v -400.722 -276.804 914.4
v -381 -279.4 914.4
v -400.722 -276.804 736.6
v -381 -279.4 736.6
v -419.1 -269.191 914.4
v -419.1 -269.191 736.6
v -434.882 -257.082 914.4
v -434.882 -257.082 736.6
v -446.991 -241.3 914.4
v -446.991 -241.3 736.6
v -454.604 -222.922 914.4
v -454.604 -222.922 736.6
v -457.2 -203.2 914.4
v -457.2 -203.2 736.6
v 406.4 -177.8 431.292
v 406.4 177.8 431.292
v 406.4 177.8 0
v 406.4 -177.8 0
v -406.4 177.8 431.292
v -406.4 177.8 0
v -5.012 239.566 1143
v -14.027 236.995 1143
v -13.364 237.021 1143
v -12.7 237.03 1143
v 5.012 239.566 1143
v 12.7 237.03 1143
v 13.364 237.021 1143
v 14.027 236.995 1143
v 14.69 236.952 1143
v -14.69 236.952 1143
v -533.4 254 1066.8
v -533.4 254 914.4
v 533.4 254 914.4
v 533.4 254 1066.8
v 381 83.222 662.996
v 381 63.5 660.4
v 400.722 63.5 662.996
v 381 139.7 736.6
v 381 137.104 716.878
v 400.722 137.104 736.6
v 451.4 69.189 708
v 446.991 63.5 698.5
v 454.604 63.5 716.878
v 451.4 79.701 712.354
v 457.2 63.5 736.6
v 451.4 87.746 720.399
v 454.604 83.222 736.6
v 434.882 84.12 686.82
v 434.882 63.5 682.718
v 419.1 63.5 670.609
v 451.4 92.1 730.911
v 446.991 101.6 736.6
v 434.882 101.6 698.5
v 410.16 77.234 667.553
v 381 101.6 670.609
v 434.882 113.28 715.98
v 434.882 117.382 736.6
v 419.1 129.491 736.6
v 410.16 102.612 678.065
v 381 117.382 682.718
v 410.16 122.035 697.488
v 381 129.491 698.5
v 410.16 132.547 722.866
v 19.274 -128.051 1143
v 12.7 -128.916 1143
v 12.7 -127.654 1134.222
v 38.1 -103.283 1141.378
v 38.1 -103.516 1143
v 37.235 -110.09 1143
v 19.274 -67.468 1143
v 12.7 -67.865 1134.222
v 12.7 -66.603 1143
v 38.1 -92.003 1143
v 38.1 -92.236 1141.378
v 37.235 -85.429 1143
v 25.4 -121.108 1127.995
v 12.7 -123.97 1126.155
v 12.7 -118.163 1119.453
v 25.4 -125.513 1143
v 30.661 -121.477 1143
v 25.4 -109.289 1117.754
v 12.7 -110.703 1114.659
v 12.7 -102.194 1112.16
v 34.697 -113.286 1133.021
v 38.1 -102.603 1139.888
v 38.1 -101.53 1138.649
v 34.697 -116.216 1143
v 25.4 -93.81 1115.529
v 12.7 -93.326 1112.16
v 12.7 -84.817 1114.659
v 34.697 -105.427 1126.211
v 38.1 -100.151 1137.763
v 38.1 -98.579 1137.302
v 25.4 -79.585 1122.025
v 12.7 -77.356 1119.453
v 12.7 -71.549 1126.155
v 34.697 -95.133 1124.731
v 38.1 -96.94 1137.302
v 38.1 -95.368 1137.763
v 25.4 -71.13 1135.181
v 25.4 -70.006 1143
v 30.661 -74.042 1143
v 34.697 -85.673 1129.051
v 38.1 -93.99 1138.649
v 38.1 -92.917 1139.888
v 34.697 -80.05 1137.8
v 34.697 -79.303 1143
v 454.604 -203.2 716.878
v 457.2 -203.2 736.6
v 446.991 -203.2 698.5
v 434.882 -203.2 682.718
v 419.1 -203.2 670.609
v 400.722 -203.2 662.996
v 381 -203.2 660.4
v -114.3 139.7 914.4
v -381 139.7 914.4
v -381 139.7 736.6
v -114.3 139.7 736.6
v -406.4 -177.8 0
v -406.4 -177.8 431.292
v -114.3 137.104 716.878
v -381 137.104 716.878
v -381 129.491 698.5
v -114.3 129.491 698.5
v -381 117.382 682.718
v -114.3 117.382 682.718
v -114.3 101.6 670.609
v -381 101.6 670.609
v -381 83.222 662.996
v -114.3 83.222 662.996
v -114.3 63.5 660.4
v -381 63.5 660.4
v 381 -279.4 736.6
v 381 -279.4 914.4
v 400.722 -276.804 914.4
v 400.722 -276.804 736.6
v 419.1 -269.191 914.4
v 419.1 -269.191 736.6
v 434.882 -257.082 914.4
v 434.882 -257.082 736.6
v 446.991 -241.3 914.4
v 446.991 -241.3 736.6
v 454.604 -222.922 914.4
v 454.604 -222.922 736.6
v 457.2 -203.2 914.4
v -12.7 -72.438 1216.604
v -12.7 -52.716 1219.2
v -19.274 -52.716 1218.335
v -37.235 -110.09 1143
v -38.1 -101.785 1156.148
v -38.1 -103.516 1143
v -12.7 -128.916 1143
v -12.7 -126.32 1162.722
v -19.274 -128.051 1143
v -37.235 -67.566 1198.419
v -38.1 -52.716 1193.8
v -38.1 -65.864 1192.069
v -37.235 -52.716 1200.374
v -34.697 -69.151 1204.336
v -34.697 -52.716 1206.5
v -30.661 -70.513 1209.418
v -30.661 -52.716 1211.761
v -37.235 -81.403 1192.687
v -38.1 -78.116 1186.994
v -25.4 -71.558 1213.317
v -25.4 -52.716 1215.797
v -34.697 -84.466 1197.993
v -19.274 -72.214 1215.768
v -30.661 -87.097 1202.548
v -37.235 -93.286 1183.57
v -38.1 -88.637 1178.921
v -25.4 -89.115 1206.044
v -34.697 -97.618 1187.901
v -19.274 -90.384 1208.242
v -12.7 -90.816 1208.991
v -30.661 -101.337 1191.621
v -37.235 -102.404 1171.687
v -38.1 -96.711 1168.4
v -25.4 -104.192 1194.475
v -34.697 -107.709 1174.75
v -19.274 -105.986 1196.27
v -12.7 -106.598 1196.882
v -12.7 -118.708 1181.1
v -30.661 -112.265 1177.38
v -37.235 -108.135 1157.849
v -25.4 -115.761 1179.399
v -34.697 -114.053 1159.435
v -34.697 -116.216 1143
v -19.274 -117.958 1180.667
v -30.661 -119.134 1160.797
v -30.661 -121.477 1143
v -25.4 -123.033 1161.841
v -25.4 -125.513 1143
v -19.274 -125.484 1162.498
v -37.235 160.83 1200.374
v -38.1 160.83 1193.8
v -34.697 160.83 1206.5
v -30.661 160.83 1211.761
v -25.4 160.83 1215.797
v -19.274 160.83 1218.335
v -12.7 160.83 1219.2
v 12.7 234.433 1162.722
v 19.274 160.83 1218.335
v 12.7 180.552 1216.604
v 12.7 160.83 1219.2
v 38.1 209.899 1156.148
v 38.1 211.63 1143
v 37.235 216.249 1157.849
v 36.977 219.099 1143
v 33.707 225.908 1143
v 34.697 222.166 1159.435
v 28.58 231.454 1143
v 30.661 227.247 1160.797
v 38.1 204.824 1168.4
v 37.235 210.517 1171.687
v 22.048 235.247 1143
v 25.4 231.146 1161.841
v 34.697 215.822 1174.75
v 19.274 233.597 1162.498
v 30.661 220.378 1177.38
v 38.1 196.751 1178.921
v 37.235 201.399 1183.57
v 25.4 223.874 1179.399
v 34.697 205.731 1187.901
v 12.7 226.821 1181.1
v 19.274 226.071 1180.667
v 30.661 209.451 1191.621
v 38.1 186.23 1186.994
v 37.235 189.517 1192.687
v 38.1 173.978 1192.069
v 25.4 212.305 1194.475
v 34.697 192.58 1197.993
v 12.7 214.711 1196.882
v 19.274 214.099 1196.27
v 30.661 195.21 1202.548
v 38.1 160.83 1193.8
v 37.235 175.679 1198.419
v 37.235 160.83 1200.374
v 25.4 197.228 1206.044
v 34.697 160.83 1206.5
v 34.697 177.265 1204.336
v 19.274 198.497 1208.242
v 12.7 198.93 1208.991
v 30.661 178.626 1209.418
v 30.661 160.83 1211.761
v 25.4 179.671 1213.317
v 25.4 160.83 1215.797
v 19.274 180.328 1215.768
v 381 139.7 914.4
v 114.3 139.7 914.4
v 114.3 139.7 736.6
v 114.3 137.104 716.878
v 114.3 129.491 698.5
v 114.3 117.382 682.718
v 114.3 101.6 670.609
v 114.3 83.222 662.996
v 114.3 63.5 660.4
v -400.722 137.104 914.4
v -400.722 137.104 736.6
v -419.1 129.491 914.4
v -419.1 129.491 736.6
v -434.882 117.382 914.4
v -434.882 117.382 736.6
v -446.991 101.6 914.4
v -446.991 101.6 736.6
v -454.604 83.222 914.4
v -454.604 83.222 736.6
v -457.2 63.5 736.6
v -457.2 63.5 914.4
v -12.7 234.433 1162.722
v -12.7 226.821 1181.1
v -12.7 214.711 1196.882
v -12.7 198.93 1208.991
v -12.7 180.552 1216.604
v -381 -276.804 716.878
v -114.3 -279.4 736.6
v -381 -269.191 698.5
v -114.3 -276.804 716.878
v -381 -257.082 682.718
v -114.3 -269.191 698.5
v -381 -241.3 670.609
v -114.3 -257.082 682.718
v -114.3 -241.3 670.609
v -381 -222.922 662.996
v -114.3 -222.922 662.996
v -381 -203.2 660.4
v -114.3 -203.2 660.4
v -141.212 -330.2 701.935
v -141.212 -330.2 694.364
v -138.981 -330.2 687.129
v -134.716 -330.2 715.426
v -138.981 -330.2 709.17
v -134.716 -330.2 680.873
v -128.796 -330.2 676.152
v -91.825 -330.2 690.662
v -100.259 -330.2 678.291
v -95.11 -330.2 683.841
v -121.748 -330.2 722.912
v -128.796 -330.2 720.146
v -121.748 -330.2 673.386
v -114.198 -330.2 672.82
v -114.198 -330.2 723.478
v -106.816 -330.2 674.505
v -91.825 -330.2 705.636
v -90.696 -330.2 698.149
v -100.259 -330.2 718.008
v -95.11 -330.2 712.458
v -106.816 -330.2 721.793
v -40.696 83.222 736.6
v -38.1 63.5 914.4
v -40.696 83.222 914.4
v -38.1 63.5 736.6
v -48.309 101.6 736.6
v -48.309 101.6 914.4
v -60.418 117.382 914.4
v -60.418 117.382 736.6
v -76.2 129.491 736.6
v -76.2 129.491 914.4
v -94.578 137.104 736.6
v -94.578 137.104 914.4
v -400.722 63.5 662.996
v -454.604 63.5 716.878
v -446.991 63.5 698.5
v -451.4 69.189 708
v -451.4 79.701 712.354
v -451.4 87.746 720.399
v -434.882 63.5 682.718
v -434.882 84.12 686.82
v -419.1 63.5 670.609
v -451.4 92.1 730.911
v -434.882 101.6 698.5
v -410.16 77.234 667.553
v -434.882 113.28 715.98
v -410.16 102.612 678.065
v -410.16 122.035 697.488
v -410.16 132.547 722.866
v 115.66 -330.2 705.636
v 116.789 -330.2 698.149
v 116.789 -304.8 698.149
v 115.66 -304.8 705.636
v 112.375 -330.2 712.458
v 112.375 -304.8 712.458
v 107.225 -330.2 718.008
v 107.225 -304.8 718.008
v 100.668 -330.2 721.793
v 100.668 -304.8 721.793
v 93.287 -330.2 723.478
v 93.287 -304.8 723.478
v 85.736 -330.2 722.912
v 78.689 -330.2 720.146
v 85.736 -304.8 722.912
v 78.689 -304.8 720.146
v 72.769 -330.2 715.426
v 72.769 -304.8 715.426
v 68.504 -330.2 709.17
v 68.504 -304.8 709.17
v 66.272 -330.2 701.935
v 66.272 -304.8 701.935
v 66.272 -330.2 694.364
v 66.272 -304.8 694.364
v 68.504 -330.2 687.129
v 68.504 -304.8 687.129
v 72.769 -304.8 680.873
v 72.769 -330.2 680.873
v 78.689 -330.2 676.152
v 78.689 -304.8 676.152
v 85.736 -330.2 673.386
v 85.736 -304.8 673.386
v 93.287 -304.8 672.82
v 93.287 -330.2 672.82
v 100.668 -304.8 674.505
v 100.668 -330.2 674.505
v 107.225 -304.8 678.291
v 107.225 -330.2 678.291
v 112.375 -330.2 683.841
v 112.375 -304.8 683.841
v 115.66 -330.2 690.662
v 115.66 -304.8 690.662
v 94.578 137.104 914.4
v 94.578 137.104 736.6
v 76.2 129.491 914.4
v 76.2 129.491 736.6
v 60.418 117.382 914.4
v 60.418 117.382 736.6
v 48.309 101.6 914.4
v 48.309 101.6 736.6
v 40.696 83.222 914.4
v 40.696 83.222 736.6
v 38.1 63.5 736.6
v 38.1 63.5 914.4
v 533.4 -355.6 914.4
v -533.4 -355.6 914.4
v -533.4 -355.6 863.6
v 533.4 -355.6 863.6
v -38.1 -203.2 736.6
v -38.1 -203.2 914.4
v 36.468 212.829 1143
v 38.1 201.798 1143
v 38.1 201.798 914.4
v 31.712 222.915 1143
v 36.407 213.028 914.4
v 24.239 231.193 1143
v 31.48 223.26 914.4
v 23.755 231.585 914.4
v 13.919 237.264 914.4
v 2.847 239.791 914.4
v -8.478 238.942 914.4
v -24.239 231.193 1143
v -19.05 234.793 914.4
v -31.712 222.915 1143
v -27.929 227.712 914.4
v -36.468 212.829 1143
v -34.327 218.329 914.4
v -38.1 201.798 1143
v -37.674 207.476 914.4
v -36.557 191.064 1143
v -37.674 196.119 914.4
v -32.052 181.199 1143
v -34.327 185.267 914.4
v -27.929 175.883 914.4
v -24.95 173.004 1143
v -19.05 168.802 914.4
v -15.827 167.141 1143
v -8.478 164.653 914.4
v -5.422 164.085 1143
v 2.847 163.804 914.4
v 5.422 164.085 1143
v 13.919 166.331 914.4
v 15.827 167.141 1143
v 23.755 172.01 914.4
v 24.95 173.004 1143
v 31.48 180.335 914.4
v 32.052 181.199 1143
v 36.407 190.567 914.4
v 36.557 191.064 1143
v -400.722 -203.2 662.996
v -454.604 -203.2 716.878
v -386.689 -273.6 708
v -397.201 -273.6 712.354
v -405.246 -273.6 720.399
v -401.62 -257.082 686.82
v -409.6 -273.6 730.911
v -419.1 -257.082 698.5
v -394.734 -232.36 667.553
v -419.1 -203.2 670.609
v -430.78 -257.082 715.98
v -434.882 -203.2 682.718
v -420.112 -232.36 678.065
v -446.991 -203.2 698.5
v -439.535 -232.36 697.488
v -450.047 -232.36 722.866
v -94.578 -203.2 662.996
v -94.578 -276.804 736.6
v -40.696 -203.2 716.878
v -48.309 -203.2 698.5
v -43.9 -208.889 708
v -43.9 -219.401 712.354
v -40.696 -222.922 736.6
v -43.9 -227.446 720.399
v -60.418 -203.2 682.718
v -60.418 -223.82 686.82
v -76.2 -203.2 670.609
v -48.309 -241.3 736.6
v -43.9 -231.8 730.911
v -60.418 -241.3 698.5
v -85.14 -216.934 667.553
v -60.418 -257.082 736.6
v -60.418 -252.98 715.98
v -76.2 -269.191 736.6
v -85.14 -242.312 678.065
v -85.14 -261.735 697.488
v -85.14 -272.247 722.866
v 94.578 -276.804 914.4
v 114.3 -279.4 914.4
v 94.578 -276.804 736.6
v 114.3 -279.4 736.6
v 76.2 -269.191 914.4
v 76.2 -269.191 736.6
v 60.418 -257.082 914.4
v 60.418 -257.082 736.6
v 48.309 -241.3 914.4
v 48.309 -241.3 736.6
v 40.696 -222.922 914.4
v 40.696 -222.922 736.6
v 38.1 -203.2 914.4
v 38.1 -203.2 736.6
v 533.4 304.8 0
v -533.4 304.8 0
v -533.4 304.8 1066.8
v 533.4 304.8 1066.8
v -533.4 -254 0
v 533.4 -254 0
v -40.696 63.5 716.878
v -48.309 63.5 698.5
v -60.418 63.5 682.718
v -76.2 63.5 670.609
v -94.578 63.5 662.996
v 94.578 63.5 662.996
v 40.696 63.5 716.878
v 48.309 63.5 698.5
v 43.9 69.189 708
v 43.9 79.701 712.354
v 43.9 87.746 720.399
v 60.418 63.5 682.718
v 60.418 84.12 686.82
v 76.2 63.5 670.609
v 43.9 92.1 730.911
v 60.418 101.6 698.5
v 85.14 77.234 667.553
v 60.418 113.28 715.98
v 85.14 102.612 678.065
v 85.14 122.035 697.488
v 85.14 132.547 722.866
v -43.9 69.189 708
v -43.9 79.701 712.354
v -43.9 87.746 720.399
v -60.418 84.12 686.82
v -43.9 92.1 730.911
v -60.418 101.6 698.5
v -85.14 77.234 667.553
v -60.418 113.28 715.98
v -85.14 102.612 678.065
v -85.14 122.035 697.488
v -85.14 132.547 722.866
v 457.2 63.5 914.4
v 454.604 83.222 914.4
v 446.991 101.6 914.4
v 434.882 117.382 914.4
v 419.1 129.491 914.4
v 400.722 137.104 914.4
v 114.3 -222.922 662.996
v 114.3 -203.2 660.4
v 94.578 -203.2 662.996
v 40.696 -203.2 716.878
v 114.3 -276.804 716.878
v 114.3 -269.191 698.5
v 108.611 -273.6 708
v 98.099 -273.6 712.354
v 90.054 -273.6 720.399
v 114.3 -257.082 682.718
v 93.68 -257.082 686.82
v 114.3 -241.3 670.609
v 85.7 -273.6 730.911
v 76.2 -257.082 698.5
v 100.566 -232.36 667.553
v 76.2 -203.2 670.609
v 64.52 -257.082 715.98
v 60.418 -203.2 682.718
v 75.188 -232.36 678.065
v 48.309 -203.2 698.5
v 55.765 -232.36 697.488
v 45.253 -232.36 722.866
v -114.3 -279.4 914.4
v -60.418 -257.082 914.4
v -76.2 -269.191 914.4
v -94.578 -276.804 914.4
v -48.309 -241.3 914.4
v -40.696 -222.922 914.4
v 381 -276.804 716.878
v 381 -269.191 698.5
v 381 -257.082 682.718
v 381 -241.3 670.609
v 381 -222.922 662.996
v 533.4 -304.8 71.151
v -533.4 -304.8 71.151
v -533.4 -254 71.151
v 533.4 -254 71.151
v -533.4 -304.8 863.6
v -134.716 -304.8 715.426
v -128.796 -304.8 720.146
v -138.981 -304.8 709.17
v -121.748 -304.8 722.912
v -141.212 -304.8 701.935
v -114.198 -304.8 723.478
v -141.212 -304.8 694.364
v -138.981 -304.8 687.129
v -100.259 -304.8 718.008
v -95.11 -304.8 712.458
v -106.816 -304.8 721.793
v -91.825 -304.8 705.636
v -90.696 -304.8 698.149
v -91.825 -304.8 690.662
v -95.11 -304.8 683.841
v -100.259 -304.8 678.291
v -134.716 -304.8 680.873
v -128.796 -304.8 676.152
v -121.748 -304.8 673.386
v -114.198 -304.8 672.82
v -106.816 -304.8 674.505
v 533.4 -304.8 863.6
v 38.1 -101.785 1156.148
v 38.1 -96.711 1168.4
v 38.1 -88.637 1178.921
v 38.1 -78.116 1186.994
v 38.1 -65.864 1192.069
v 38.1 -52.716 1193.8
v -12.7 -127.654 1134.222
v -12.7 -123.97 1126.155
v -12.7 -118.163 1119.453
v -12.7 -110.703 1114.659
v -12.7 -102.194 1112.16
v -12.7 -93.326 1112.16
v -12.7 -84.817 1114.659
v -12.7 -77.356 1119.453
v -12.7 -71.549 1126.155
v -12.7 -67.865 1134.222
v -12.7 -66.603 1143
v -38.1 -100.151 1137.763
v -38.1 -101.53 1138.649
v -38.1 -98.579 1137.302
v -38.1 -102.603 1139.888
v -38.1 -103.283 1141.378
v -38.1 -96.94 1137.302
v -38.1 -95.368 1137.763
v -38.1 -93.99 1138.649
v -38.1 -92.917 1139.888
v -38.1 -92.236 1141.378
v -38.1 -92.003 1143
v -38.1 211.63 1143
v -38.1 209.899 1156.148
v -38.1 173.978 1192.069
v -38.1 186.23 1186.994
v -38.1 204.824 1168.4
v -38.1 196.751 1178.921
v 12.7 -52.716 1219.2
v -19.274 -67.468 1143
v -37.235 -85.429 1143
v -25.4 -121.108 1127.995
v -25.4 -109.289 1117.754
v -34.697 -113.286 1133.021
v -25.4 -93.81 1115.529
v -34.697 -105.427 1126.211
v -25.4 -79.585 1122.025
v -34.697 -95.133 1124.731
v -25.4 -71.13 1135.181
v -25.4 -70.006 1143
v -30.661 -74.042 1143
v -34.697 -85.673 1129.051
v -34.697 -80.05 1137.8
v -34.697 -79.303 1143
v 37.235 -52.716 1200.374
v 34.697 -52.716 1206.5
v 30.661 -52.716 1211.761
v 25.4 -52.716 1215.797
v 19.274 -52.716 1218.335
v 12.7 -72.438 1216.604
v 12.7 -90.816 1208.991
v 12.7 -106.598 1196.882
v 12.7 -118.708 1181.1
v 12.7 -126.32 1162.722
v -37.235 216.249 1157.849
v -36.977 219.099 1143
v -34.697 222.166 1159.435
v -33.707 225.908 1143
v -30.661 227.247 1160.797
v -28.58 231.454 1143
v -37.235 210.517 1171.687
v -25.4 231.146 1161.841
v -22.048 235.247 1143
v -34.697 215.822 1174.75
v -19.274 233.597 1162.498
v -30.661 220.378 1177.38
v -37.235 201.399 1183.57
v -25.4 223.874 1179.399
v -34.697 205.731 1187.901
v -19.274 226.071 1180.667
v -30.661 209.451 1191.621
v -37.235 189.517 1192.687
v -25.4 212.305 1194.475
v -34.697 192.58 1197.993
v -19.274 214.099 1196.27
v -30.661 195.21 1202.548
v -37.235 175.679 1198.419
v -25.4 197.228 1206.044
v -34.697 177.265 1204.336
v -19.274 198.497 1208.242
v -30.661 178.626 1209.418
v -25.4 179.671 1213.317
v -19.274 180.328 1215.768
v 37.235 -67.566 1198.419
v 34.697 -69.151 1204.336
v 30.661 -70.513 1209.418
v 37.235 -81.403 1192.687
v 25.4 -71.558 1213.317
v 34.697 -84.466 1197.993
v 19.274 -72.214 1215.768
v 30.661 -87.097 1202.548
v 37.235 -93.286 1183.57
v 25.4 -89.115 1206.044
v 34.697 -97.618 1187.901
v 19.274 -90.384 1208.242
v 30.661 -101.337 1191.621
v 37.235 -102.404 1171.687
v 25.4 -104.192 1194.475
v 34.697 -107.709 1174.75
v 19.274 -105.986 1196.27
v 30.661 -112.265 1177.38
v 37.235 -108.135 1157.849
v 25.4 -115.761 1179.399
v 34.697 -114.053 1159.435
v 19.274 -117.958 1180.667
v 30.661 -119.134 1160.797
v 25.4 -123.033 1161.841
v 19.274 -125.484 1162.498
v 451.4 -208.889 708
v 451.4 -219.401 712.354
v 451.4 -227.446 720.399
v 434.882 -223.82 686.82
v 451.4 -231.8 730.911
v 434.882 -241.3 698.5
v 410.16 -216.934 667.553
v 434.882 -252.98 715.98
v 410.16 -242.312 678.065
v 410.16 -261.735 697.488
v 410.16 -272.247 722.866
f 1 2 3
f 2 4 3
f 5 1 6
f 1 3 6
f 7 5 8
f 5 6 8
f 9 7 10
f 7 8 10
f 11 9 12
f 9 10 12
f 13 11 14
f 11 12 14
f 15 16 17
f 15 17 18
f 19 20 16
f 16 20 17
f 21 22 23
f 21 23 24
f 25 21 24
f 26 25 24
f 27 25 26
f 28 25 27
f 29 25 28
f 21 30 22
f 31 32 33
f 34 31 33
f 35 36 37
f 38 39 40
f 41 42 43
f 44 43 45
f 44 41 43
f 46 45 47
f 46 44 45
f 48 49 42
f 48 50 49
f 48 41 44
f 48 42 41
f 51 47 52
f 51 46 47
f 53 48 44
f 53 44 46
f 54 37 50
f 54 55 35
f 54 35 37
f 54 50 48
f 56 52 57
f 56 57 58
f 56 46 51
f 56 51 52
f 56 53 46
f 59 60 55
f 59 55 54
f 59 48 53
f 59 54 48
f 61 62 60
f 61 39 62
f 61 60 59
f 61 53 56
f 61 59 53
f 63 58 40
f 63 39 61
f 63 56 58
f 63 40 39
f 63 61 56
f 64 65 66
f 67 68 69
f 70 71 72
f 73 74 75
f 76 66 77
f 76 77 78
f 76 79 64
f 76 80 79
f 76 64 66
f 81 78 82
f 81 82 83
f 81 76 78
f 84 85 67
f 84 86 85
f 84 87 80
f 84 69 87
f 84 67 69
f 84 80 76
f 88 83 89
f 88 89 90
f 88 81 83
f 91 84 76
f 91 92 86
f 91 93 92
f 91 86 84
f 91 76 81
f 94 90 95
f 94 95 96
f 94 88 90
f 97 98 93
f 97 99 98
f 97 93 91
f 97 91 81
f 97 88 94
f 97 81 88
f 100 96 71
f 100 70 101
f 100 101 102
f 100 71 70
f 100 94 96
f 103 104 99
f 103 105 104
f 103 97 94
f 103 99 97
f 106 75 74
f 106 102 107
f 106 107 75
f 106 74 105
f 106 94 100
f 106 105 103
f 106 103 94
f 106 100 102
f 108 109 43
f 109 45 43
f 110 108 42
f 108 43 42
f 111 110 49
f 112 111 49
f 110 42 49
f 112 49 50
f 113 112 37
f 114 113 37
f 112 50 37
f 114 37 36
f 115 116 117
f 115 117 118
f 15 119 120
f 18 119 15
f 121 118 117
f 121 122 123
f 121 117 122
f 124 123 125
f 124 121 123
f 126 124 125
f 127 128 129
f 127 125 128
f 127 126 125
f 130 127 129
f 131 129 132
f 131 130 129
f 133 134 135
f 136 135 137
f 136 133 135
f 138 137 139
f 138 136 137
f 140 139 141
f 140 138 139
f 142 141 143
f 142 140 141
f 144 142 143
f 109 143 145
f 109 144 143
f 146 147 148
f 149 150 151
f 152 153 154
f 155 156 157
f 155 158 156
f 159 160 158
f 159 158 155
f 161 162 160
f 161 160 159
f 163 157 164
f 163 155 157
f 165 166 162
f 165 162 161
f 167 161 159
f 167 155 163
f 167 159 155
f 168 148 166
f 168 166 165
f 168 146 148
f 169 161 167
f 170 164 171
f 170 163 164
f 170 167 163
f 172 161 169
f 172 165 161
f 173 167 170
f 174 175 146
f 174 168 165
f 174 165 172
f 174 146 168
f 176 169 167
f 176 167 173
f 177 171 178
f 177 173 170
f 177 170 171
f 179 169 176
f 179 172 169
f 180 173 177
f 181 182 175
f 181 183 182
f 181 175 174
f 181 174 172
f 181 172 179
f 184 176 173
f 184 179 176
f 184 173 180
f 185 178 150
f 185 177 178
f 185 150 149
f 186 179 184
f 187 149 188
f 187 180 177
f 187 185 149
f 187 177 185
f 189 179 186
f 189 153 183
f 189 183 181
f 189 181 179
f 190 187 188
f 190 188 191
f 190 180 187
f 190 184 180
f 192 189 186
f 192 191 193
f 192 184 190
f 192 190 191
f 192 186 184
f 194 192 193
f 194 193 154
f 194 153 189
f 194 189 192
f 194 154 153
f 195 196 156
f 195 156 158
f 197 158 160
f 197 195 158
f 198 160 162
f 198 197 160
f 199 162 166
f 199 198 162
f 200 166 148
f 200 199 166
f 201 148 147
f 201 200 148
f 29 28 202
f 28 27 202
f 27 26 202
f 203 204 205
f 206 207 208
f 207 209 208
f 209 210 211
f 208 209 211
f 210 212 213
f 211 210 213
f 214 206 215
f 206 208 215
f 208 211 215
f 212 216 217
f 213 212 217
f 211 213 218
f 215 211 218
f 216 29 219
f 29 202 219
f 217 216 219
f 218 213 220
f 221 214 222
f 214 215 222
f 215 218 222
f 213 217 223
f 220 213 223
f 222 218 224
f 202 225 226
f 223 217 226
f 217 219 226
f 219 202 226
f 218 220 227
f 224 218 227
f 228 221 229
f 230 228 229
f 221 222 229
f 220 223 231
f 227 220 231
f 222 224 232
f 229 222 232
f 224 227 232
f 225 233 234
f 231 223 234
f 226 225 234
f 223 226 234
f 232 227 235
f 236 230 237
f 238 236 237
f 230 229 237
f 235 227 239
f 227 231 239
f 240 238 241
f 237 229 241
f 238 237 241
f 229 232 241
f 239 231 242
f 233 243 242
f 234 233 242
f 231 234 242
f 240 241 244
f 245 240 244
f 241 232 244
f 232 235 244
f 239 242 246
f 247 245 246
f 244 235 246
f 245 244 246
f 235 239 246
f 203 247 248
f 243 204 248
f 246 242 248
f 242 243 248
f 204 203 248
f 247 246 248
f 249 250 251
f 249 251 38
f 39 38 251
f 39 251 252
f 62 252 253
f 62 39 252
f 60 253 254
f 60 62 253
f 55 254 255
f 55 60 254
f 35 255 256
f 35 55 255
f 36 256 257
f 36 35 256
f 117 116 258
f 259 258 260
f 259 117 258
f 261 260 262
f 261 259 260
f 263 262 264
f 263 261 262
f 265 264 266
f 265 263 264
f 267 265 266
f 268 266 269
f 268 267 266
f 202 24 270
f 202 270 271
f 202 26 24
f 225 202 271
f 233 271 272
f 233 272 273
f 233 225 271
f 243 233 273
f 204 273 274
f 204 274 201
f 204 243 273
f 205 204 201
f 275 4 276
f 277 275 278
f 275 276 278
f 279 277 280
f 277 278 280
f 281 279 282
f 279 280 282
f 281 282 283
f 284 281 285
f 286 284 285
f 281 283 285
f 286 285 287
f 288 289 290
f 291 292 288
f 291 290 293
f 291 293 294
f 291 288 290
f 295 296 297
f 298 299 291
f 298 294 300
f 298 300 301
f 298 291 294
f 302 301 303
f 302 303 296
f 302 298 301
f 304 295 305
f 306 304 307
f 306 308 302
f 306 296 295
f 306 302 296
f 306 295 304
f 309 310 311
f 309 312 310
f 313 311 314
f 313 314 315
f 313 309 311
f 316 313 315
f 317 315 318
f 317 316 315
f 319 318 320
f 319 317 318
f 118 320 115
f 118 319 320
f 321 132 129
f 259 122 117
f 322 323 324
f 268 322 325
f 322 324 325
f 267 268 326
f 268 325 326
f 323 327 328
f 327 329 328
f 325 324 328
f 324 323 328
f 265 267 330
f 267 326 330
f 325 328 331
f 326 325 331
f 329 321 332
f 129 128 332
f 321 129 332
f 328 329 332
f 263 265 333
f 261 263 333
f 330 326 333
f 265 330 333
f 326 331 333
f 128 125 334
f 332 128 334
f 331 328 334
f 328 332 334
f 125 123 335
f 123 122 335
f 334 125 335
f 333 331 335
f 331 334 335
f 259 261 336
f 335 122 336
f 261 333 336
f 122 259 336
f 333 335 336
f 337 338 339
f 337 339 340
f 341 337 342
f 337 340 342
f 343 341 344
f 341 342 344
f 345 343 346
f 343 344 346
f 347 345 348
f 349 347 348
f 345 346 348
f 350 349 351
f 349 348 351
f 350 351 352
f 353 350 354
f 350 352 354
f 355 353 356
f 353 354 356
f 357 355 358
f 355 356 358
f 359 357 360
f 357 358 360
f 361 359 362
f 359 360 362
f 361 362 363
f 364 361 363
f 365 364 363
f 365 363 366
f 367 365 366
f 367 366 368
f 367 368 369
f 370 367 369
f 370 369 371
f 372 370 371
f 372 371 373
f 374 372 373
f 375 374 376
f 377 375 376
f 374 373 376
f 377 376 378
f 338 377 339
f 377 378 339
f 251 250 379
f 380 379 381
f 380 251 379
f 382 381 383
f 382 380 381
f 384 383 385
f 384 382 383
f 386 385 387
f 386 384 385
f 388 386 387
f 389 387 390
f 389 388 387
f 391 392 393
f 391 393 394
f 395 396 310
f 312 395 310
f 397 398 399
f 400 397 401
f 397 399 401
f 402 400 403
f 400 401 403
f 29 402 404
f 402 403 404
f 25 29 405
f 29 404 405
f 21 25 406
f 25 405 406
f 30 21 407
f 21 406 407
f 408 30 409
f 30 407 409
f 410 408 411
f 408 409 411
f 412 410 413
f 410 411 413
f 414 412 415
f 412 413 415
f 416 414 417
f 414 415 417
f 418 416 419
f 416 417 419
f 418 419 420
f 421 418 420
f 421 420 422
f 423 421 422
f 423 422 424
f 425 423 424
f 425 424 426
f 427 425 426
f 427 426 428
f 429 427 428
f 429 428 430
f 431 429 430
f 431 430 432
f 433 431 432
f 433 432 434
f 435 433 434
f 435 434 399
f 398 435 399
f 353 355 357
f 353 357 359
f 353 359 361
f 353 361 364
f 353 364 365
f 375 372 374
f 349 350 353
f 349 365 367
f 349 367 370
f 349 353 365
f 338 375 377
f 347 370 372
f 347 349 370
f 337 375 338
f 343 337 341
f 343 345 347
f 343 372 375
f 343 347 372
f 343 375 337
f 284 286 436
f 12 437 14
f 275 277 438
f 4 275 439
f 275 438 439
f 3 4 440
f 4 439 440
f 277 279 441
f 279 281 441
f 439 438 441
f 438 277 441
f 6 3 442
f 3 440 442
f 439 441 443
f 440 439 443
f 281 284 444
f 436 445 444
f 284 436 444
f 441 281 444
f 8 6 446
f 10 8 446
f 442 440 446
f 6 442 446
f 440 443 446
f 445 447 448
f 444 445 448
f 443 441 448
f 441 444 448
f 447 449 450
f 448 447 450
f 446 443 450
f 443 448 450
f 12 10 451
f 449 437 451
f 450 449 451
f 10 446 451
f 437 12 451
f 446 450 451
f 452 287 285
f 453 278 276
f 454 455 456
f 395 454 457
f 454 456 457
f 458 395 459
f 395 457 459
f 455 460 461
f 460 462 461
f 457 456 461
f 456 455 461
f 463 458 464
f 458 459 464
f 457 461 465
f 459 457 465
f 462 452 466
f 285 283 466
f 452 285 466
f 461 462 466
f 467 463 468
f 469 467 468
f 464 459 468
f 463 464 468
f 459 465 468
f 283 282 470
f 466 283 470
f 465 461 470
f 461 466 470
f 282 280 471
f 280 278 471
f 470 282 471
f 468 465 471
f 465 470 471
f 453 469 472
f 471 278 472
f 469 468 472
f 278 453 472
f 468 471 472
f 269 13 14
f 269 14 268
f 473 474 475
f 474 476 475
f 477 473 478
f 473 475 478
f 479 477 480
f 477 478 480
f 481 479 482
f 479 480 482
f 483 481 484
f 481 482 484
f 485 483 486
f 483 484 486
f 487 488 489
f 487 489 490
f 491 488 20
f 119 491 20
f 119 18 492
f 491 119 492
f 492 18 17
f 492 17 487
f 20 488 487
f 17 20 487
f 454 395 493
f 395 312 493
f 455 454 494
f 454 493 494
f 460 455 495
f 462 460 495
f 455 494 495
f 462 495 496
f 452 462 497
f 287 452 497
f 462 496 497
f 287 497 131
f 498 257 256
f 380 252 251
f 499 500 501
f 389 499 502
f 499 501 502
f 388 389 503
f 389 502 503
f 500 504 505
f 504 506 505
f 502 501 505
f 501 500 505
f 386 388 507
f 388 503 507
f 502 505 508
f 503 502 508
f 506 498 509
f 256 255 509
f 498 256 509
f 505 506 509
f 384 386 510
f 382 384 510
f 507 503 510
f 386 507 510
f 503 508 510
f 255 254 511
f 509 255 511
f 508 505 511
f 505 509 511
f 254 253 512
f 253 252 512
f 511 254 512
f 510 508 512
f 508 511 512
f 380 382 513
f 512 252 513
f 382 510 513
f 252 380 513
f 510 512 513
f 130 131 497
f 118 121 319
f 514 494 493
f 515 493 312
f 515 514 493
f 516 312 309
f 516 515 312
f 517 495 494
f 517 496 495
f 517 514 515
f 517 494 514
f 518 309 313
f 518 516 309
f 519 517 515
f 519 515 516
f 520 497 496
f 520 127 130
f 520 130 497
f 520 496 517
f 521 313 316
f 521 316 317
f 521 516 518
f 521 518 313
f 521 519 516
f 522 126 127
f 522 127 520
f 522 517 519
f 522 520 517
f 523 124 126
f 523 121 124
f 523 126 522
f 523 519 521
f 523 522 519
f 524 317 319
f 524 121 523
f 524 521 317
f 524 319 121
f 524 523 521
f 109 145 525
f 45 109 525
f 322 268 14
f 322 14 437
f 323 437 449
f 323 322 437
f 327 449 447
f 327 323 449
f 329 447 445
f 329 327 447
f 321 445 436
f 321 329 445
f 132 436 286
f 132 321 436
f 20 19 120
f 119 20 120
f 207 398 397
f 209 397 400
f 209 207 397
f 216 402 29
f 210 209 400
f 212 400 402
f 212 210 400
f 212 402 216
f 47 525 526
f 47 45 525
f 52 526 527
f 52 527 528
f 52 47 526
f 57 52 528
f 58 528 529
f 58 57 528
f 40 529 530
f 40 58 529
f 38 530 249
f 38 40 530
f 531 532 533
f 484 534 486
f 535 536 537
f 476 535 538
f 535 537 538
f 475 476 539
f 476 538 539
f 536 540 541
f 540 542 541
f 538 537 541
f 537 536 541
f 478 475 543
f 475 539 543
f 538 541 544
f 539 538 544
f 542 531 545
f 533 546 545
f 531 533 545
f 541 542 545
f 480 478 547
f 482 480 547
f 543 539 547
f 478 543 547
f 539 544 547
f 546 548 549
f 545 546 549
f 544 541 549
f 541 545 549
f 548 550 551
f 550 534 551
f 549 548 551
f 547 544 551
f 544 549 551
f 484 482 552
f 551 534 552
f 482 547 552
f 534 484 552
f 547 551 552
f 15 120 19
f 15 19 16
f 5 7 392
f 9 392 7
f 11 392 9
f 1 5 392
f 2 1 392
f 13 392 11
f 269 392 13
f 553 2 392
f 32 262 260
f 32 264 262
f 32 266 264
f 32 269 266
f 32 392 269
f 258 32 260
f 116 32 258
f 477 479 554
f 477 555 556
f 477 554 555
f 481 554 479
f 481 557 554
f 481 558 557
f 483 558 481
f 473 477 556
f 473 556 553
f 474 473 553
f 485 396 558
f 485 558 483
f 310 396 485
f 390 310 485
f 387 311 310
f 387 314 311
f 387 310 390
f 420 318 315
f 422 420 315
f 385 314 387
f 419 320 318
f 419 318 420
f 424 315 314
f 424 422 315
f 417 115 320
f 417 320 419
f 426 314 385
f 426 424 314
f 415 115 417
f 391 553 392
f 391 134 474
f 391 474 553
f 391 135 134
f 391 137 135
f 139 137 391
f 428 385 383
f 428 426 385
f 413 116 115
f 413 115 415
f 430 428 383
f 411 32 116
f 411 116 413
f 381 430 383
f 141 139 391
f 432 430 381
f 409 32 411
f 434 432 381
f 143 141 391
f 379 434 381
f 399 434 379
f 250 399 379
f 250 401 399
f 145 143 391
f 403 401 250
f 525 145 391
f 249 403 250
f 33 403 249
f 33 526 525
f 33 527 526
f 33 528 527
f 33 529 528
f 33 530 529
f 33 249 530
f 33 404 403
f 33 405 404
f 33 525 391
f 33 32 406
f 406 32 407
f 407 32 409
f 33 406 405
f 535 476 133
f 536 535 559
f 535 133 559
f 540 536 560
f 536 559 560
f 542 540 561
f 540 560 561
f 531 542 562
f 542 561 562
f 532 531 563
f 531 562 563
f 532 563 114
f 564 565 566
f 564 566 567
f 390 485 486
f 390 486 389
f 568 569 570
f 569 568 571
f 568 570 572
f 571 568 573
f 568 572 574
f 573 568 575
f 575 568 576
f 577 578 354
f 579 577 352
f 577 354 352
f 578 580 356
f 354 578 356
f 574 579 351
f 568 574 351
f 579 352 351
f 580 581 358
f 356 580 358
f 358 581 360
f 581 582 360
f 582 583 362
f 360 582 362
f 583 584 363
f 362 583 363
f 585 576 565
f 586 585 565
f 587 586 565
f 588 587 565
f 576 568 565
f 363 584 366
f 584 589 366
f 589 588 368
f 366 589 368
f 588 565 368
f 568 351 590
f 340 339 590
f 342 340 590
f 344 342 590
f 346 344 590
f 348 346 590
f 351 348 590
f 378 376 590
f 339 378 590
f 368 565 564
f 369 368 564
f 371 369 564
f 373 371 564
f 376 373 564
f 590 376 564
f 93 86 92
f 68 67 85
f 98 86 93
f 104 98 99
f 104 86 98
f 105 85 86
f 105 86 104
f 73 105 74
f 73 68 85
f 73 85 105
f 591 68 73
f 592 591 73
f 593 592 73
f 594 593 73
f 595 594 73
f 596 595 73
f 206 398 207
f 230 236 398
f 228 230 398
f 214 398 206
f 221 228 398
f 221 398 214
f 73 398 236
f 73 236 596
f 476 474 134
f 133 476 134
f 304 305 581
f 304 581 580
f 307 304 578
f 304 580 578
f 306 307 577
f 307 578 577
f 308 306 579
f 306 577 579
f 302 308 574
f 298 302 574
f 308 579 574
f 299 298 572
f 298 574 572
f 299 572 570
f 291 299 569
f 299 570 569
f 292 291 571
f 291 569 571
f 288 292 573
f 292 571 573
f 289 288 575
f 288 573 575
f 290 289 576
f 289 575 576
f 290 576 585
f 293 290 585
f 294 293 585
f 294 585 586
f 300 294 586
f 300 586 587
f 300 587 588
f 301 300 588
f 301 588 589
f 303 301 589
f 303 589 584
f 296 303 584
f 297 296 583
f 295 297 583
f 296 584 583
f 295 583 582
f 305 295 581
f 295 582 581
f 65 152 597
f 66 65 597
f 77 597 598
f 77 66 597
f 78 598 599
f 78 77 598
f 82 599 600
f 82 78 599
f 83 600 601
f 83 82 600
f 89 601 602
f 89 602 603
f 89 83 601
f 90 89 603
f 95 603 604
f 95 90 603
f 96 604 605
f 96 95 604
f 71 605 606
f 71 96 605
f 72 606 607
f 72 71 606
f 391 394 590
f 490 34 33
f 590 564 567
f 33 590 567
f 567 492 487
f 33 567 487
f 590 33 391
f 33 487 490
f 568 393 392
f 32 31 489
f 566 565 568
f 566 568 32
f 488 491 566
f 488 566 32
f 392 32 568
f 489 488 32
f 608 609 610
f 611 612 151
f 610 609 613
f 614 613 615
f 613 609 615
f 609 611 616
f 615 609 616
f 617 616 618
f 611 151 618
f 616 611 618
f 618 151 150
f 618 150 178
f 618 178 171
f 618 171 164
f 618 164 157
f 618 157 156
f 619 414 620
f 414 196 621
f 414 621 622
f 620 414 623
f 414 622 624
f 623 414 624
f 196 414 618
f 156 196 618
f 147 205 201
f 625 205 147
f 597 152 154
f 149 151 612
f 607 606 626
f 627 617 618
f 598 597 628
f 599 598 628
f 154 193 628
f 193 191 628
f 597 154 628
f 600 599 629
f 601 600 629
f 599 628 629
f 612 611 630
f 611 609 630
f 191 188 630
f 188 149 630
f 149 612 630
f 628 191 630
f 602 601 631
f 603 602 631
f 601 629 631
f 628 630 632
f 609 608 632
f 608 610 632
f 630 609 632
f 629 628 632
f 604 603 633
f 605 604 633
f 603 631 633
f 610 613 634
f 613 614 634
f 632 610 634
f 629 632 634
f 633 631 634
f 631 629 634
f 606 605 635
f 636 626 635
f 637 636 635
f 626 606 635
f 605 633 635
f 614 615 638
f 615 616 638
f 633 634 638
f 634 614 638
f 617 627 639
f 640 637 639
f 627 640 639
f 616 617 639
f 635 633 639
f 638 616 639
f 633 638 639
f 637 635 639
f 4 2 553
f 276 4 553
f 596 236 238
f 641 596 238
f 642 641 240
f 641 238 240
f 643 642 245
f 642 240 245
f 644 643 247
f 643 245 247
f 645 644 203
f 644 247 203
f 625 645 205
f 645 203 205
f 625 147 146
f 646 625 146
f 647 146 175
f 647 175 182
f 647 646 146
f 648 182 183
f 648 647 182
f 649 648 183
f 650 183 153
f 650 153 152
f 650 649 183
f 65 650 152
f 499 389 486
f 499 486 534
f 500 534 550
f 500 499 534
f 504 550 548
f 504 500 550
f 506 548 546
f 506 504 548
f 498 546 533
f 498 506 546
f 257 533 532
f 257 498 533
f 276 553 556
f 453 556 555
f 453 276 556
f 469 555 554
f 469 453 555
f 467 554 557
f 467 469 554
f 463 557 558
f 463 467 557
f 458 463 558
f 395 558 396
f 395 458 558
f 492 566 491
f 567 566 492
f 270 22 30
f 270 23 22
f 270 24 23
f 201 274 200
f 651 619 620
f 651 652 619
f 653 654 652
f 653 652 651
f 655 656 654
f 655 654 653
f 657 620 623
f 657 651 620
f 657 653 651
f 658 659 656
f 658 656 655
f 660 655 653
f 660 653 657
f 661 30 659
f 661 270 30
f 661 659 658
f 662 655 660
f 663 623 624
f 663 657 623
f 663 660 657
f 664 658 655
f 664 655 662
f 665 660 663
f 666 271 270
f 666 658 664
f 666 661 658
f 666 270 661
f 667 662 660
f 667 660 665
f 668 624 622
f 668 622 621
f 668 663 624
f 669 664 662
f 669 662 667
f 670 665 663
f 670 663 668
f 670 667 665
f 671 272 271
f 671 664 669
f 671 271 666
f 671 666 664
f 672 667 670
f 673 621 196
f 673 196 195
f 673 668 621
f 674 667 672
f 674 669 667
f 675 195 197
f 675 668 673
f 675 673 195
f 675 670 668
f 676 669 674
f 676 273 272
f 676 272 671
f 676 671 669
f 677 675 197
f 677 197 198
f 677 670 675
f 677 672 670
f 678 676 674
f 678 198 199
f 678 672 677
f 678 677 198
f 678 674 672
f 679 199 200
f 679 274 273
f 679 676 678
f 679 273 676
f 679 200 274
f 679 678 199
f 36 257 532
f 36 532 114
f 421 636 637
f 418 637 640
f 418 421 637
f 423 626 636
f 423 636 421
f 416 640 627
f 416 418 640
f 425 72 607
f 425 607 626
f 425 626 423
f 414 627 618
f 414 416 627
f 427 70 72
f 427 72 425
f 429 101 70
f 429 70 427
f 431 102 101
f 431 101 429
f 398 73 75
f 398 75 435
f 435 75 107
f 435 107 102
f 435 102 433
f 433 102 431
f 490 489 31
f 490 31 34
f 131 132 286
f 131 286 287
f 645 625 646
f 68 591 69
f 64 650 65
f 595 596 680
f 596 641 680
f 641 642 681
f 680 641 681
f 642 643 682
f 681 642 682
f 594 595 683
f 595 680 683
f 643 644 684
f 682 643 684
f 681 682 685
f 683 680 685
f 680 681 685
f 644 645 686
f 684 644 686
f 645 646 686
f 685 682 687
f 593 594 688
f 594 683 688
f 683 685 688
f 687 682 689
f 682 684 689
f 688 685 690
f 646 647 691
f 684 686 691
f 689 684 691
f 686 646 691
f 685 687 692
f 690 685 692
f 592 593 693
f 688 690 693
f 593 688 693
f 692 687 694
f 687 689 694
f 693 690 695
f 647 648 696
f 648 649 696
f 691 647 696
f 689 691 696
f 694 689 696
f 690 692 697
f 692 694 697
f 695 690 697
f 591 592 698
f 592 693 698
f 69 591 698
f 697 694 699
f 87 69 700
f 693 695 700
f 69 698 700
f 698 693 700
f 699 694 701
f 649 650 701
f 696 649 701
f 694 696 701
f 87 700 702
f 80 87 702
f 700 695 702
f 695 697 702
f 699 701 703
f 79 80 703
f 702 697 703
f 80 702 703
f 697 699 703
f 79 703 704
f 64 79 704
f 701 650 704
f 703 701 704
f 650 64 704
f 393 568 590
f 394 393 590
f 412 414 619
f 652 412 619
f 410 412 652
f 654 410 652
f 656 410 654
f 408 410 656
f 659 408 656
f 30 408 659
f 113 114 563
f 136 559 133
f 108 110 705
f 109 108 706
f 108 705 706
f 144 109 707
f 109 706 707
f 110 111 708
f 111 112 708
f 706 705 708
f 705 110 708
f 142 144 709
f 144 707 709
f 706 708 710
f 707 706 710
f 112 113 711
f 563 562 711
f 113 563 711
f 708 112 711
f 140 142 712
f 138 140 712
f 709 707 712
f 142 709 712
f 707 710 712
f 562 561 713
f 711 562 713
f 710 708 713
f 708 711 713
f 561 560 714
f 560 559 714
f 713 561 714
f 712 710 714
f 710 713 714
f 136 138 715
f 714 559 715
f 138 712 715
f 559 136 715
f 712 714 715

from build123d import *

# Parameters (mm, degrees)
F0_W          = 1066.8
F0_H          = 609.6
F1_DEPTH      = 914.4
F2_W          = 1066.8
F2_H          = 50.8
F2_H_2        = 609.6
F3_DEPTH      = 50.8
F4_W          = 1066.8
F4_H          = 50.8
F5_DEPTH      = 152.4
F4_W_2        = 419.1
F4_H_2        = 419.1
F6_DEPTH      = 254
F7_R          = 76.2
F4_R          = 38.1
F8_DEPTH      = 228.6
F10_DEPTH     = 38.1
F11_T3_DEPTH  = 213.5462481737
F11_T6_DEPTH  = 213.5462481737
F11_T9_ANGLE  = 180
F11_T12_ANGLE = 180
F11_T15_ANGLE = 90
F11_T18_ANGLE = 90
F11_T21_ANGLE = 90
F11_T24_ANGLE = 90
F12_W         = 812.8
F12_H         = 355.6
F13_DEPTH     = 431.292
F14_W         = 1066.8
F14_H         = 71.1514726281
F15_DEPTH     = 50.8
F16_R         = 25.4
F17_DEPTH     = 25.4


# Not quite as in the source:
# - a fillet or chamfer that OpenCascade refuses, or shapes differently, is made with other operations: its cross-section is extruded or revolved along the edge and cut away or added


with BuildPart() as f1:
    # F0 (on Top) → F1 (new body)
    with BuildSketch(Plane.XY):
        Rectangle(F0_W, F0_H)
    extrude(amount=F1_DEPTH)

    # F2 (on face) → F3 (join)
    with BuildSketch(Plane.XY.offset(914.4)):
        with Locations((0, -330.2)):
            Rectangle(F2_W, F2_H)
        Rectangle(F2_W, F2_H_2)
    extrude(amount=-F3_DEPTH)

    # F4 (on face) → F5 (join)
    with BuildSketch(Plane.XY.offset(914.4)):
        with Locations((0, 279.4)):
            Rectangle(F4_W, F4_H)
    extrude(amount=F5_DEPTH)

    # F4 (on face) → F6 (cut)
    with BuildSketch(Plane.XY.offset(914.4)):
        with Locations((-247.65, -69.85)):
            Rectangle(F4_W_2, F4_H_2)
        with Locations((247.65, -69.85)):
            Rectangle(F4_W_2, F4_H_2)
    extrude(amount=-F6_DEPTH, mode=Mode.SUBTRACT)

    # F7
    f7_edges = [f1.edges().sort_by_distance(p)[0] for p in [
        (-247.65, 139.7, 660.4),
        (-457.2, -69.85, 660.4),
        (-247.65, -279.4, 660.4),
        (-38.1, -69.85, 660.4),
        (247.65, 139.7, 660.4),
        (38.1, -69.85, 660.4),
        (247.65, -279.4, 660.4),
        (457.2, -69.85, 660.4),
        (457.2, 139.7, 787.4),
        (38.1, 139.7, 787.4),
        (457.2, -279.4, 787.4),
        (38.1, -279.4, 787.4),
        (-457.2, -279.4, 787.4),
        (-38.1, -279.4, 787.4),
        (-38.1, 139.7, 787.4),
        (-457.2, 139.7, 787.4),
    ]]
    fillet(f7_edges, radius=F7_R)

    # F4 (on face) → F8 (join)
    with BuildSketch(Plane.XY.offset(914.4)):
        with Locations((0, 201.7975896597)):
            Circle(F4_R)
    extrude(amount=F8_DEPTH)

    # F9 (on Right) → F10 (join, symmetric)
    with BuildSketch(Plane.YZ):
        with BuildLine():
            Line((160.8298355818, 1219.2), (-52.7164125919, 1219.2))
            ThreePointArc((-52.7164125919, 1219.2), (-106.5979493183, 1196.8815367264), (-128.9164125919, 1143))
            ThreePointArc((-128.9164125919, 1143), (-97.7595895529, 1174.1568230391), (-66.6027665138, 1143))
            Line((-66.6027665138, 1143), (237.0298355818, 1143))
            ThreePointArc((237.0298355818, 1143), (214.7113723082, 1196.8815367264), (160.8298355818, 1219.2))
        make_face()
        with BuildLine():
            ThreePointArc((-66.6027665138, 1143), (-97.7595895529, 1174.1568230391), (-128.9164125919, 1143))
            Line((-128.9164125919, 1143), (-66.6027665138, 1143))
        make_face()
        with BuildLine():
            Line((-66.6027665138, 1143), (-128.9164125919, 1143))
            ThreePointArc((-128.9164125919, 1143), (-97.7595895529, 1111.8431769609), (-66.6027665138, 1143))
        make_face()
    extrude(amount=F10_DEPTH, both=True)

    # F11: fillet of radius 25.4 on 8 edges, made by hand


with BuildPart() as f11_tool1:
    # F11_s2 → F11_t3 (new body)
    with BuildSketch(Plane.XZ.offset(-160.8298355818)):
        with BuildLine():
            ThreePointArc((38.1, 1193.8), (30.6605122421, 1211.7605122421), (12.7, 1219.2))
            Line((12.7, 1219.2), (12.7, 1219.708))
            Line((12.7, 1219.708), (38.608, 1219.708))
            Line((38.608, 1219.708), (38.608, 1193.8))
            Line((38.608, 1193.8), (38.1, 1193.8))
        make_face()
    extrude(amount=F11_T3_DEPTH)


with BuildPart() as f11_tool4:
    # F11_s5 → F11_t6 (new body)
    with BuildSketch(Plane.XZ.offset(-160.8298355818)):
        with BuildLine():
            ThreePointArc((-38.1, 1193.8), (-30.6605122421, 1211.7605122421), (-12.7, 1219.2))
            Line((-12.7, 1219.2), (-12.7, 1219.708))
            Line((-12.7, 1219.708), (-38.608, 1219.708))
            Line((-38.608, 1219.708), (-38.608, 1193.8))
            Line((-38.608, 1193.8), (-38.1, 1193.8))
        make_face()
    extrude(amount=F11_T6_DEPTH)


with BuildPart() as f11_tool7:
    # F11_s8 → F11_t9 (revolve)
    with BuildSketch(Plane.XY.offset(1143)):
        with BuildLine():
            ThreePointArc((-12.7, -128.9164125919), (-30.6605122421, -121.4769248341), (-38.1, -103.5164125919))
            Line((-38.1, -103.5164125919), (-38.608, -103.5164125919))
            Line((-38.608, -103.5164125919), (-38.608, -129.4244125919))
            Line((-38.608, -129.4244125919), (-12.7, -129.4244125919))
            Line((-12.7, -129.4244125919), (-12.7, -128.9164125919))
        make_face()
    revolve(axis=Axis((-38.1, -97.7595895529, 1143), (1, 0, 0)), revolution_arc=F11_T9_ANGLE)


with BuildPart() as f11_tool10:
    # F11_s11 → F11_t12 (revolve)
    with BuildSketch(Plane.XY.offset(1143)):
        with BuildLine():
            ThreePointArc((12.7, -128.9164125919), (30.6605122421, -121.4769248341), (38.1, -103.5164125919))
            Line((38.1, -103.5164125919), (38.608, -103.5164125919))
            Line((38.608, -103.5164125919), (38.608, -129.4244125919))
            Line((38.608, -129.4244125919), (12.7, -129.4244125919))
            Line((12.7, -129.4244125919), (12.7, -128.9164125919))
        make_face()
    revolve(axis=Axis((38.1, -97.7595895529, 1143), (1, 0, 0)), revolution_arc=F11_T12_ANGLE)


with BuildPart() as f11_tool13:
    # F11_s14 → F11_t15 (revolve)
    with BuildSketch(Plane.XZ.offset(52.7164125919)):
        with BuildLine():
            ThreePointArc((38.1, 1193.8), (30.6605122421, 1211.7605122421), (12.7, 1219.2))
            Line((12.7, 1219.2), (12.7, 1219.708))
            Line((12.7, 1219.708), (38.608, 1219.708))
            Line((38.608, 1219.708), (38.608, 1193.8))
            Line((38.608, 1193.8), (38.1, 1193.8))
        make_face()
    revolve(axis=Axis((38.1, -52.7164125919, 1143), (1, 0, 0)), revolution_arc=F11_T15_ANGLE)


with BuildPart() as f11_tool16:
    # F11_s17 → F11_t18 (revolve)
    with BuildSketch(Plane.XY.offset(1143)):
        with BuildLine():
            ThreePointArc((38.1, 211.6298355818), (30.6605122421, 229.5903478239), (12.7, 237.0298355818))
            Line((12.7, 237.0298355818), (12.7, 237.5378355818))
            Line((12.7, 237.5378355818), (38.608, 237.5378355818))
            Line((38.608, 237.5378355818), (38.608, 211.6298355818))
            Line((38.608, 211.6298355818), (38.1, 211.6298355818))
        make_face()
    revolve(axis=Axis((38.1, 160.8298355818, 1143), (1, 0, 0)), revolution_arc=F11_T18_ANGLE)


with BuildPart() as f11_tool19:
    # F11_s20 → F11_t21 (revolve)
    with BuildSketch(Plane.XZ.offset(52.7164125919)):
        with BuildLine():
            ThreePointArc((-38.1, 1193.8), (-30.6605122421, 1211.7605122421), (-12.7, 1219.2))
            Line((-12.7, 1219.2), (-12.7, 1219.708))
            Line((-12.7, 1219.708), (-38.608, 1219.708))
            Line((-38.608, 1219.708), (-38.608, 1193.8))
            Line((-38.608, 1193.8), (-38.1, 1193.8))
        make_face()
    revolve(axis=Axis((-38.1, -52.7164125919, 1143), (1, 0, 0)), revolution_arc=F11_T21_ANGLE)


with BuildPart() as f11_tool22:
    # F11_s23 → F11_t24 (revolve)
    with BuildSketch(Plane.XY.offset(1143)):
        with BuildLine():
            ThreePointArc((-38.1, 211.6298355818), (-30.6605122421, 229.5903478239), (-12.7, 237.0298355818))
            Line((-12.7, 237.0298355818), (-12.7, 237.5378355818))
            Line((-12.7, 237.5378355818), (-38.608, 237.5378355818))
            Line((-38.608, 237.5378355818), (-38.608, 211.6298355818))
            Line((-38.608, 211.6298355818), (-38.1, 211.6298355818))
        make_face()
    revolve(axis=Axis((-38.1, 160.8298355818, 1143), (1, 0, 0)), revolution_arc=F11_T24_ANGLE)


with BuildPart() as f1_1:
    add(f1.part)

    # F11_t25: cut F11_tool1, F11_tool4, F11_tool7, F11_tool10, F11_tool13, F11_tool16, F11_tool19, F11_tool22
    add([f11_tool1.part, f11_tool4.part, f11_tool7.part, f11_tool10.part, f11_tool13.part, f11_tool16.part, f11_tool19.part, f11_tool22.part], mode=Mode.SUBTRACT)

    # F12 (on face) → F13 (cut)
    with BuildSketch(Plane(origin=(0, 0, 0), x_dir=(1, 0, 0), z_dir=(0, 0, -1))):
        Rectangle(F12_W, F12_H)
    extrude(amount=-F13_DEPTH, mode=Mode.SUBTRACT)

    # F14 (on face) → F15 (cut)
    with BuildSketch(Plane.XZ.offset(304.8)):
        with Locations((0, 35.5757363141)):
            Rectangle(F14_W, F14_H)
    extrude(amount=-F15_DEPTH, mode=Mode.SUBTRACT)

    # F16 (on face) → F17 (join)
    with BuildSketch(Plane.XZ.offset(304.8)):
        with Locations((-116.0961332864, 698.1492042542)):
            Circle(F16_R)
        with Locations((91.3885235786, 698.1492042542)):
            Circle(F16_R)
    extrude(amount=F17_DEPTH)


solid = f1_1.part
